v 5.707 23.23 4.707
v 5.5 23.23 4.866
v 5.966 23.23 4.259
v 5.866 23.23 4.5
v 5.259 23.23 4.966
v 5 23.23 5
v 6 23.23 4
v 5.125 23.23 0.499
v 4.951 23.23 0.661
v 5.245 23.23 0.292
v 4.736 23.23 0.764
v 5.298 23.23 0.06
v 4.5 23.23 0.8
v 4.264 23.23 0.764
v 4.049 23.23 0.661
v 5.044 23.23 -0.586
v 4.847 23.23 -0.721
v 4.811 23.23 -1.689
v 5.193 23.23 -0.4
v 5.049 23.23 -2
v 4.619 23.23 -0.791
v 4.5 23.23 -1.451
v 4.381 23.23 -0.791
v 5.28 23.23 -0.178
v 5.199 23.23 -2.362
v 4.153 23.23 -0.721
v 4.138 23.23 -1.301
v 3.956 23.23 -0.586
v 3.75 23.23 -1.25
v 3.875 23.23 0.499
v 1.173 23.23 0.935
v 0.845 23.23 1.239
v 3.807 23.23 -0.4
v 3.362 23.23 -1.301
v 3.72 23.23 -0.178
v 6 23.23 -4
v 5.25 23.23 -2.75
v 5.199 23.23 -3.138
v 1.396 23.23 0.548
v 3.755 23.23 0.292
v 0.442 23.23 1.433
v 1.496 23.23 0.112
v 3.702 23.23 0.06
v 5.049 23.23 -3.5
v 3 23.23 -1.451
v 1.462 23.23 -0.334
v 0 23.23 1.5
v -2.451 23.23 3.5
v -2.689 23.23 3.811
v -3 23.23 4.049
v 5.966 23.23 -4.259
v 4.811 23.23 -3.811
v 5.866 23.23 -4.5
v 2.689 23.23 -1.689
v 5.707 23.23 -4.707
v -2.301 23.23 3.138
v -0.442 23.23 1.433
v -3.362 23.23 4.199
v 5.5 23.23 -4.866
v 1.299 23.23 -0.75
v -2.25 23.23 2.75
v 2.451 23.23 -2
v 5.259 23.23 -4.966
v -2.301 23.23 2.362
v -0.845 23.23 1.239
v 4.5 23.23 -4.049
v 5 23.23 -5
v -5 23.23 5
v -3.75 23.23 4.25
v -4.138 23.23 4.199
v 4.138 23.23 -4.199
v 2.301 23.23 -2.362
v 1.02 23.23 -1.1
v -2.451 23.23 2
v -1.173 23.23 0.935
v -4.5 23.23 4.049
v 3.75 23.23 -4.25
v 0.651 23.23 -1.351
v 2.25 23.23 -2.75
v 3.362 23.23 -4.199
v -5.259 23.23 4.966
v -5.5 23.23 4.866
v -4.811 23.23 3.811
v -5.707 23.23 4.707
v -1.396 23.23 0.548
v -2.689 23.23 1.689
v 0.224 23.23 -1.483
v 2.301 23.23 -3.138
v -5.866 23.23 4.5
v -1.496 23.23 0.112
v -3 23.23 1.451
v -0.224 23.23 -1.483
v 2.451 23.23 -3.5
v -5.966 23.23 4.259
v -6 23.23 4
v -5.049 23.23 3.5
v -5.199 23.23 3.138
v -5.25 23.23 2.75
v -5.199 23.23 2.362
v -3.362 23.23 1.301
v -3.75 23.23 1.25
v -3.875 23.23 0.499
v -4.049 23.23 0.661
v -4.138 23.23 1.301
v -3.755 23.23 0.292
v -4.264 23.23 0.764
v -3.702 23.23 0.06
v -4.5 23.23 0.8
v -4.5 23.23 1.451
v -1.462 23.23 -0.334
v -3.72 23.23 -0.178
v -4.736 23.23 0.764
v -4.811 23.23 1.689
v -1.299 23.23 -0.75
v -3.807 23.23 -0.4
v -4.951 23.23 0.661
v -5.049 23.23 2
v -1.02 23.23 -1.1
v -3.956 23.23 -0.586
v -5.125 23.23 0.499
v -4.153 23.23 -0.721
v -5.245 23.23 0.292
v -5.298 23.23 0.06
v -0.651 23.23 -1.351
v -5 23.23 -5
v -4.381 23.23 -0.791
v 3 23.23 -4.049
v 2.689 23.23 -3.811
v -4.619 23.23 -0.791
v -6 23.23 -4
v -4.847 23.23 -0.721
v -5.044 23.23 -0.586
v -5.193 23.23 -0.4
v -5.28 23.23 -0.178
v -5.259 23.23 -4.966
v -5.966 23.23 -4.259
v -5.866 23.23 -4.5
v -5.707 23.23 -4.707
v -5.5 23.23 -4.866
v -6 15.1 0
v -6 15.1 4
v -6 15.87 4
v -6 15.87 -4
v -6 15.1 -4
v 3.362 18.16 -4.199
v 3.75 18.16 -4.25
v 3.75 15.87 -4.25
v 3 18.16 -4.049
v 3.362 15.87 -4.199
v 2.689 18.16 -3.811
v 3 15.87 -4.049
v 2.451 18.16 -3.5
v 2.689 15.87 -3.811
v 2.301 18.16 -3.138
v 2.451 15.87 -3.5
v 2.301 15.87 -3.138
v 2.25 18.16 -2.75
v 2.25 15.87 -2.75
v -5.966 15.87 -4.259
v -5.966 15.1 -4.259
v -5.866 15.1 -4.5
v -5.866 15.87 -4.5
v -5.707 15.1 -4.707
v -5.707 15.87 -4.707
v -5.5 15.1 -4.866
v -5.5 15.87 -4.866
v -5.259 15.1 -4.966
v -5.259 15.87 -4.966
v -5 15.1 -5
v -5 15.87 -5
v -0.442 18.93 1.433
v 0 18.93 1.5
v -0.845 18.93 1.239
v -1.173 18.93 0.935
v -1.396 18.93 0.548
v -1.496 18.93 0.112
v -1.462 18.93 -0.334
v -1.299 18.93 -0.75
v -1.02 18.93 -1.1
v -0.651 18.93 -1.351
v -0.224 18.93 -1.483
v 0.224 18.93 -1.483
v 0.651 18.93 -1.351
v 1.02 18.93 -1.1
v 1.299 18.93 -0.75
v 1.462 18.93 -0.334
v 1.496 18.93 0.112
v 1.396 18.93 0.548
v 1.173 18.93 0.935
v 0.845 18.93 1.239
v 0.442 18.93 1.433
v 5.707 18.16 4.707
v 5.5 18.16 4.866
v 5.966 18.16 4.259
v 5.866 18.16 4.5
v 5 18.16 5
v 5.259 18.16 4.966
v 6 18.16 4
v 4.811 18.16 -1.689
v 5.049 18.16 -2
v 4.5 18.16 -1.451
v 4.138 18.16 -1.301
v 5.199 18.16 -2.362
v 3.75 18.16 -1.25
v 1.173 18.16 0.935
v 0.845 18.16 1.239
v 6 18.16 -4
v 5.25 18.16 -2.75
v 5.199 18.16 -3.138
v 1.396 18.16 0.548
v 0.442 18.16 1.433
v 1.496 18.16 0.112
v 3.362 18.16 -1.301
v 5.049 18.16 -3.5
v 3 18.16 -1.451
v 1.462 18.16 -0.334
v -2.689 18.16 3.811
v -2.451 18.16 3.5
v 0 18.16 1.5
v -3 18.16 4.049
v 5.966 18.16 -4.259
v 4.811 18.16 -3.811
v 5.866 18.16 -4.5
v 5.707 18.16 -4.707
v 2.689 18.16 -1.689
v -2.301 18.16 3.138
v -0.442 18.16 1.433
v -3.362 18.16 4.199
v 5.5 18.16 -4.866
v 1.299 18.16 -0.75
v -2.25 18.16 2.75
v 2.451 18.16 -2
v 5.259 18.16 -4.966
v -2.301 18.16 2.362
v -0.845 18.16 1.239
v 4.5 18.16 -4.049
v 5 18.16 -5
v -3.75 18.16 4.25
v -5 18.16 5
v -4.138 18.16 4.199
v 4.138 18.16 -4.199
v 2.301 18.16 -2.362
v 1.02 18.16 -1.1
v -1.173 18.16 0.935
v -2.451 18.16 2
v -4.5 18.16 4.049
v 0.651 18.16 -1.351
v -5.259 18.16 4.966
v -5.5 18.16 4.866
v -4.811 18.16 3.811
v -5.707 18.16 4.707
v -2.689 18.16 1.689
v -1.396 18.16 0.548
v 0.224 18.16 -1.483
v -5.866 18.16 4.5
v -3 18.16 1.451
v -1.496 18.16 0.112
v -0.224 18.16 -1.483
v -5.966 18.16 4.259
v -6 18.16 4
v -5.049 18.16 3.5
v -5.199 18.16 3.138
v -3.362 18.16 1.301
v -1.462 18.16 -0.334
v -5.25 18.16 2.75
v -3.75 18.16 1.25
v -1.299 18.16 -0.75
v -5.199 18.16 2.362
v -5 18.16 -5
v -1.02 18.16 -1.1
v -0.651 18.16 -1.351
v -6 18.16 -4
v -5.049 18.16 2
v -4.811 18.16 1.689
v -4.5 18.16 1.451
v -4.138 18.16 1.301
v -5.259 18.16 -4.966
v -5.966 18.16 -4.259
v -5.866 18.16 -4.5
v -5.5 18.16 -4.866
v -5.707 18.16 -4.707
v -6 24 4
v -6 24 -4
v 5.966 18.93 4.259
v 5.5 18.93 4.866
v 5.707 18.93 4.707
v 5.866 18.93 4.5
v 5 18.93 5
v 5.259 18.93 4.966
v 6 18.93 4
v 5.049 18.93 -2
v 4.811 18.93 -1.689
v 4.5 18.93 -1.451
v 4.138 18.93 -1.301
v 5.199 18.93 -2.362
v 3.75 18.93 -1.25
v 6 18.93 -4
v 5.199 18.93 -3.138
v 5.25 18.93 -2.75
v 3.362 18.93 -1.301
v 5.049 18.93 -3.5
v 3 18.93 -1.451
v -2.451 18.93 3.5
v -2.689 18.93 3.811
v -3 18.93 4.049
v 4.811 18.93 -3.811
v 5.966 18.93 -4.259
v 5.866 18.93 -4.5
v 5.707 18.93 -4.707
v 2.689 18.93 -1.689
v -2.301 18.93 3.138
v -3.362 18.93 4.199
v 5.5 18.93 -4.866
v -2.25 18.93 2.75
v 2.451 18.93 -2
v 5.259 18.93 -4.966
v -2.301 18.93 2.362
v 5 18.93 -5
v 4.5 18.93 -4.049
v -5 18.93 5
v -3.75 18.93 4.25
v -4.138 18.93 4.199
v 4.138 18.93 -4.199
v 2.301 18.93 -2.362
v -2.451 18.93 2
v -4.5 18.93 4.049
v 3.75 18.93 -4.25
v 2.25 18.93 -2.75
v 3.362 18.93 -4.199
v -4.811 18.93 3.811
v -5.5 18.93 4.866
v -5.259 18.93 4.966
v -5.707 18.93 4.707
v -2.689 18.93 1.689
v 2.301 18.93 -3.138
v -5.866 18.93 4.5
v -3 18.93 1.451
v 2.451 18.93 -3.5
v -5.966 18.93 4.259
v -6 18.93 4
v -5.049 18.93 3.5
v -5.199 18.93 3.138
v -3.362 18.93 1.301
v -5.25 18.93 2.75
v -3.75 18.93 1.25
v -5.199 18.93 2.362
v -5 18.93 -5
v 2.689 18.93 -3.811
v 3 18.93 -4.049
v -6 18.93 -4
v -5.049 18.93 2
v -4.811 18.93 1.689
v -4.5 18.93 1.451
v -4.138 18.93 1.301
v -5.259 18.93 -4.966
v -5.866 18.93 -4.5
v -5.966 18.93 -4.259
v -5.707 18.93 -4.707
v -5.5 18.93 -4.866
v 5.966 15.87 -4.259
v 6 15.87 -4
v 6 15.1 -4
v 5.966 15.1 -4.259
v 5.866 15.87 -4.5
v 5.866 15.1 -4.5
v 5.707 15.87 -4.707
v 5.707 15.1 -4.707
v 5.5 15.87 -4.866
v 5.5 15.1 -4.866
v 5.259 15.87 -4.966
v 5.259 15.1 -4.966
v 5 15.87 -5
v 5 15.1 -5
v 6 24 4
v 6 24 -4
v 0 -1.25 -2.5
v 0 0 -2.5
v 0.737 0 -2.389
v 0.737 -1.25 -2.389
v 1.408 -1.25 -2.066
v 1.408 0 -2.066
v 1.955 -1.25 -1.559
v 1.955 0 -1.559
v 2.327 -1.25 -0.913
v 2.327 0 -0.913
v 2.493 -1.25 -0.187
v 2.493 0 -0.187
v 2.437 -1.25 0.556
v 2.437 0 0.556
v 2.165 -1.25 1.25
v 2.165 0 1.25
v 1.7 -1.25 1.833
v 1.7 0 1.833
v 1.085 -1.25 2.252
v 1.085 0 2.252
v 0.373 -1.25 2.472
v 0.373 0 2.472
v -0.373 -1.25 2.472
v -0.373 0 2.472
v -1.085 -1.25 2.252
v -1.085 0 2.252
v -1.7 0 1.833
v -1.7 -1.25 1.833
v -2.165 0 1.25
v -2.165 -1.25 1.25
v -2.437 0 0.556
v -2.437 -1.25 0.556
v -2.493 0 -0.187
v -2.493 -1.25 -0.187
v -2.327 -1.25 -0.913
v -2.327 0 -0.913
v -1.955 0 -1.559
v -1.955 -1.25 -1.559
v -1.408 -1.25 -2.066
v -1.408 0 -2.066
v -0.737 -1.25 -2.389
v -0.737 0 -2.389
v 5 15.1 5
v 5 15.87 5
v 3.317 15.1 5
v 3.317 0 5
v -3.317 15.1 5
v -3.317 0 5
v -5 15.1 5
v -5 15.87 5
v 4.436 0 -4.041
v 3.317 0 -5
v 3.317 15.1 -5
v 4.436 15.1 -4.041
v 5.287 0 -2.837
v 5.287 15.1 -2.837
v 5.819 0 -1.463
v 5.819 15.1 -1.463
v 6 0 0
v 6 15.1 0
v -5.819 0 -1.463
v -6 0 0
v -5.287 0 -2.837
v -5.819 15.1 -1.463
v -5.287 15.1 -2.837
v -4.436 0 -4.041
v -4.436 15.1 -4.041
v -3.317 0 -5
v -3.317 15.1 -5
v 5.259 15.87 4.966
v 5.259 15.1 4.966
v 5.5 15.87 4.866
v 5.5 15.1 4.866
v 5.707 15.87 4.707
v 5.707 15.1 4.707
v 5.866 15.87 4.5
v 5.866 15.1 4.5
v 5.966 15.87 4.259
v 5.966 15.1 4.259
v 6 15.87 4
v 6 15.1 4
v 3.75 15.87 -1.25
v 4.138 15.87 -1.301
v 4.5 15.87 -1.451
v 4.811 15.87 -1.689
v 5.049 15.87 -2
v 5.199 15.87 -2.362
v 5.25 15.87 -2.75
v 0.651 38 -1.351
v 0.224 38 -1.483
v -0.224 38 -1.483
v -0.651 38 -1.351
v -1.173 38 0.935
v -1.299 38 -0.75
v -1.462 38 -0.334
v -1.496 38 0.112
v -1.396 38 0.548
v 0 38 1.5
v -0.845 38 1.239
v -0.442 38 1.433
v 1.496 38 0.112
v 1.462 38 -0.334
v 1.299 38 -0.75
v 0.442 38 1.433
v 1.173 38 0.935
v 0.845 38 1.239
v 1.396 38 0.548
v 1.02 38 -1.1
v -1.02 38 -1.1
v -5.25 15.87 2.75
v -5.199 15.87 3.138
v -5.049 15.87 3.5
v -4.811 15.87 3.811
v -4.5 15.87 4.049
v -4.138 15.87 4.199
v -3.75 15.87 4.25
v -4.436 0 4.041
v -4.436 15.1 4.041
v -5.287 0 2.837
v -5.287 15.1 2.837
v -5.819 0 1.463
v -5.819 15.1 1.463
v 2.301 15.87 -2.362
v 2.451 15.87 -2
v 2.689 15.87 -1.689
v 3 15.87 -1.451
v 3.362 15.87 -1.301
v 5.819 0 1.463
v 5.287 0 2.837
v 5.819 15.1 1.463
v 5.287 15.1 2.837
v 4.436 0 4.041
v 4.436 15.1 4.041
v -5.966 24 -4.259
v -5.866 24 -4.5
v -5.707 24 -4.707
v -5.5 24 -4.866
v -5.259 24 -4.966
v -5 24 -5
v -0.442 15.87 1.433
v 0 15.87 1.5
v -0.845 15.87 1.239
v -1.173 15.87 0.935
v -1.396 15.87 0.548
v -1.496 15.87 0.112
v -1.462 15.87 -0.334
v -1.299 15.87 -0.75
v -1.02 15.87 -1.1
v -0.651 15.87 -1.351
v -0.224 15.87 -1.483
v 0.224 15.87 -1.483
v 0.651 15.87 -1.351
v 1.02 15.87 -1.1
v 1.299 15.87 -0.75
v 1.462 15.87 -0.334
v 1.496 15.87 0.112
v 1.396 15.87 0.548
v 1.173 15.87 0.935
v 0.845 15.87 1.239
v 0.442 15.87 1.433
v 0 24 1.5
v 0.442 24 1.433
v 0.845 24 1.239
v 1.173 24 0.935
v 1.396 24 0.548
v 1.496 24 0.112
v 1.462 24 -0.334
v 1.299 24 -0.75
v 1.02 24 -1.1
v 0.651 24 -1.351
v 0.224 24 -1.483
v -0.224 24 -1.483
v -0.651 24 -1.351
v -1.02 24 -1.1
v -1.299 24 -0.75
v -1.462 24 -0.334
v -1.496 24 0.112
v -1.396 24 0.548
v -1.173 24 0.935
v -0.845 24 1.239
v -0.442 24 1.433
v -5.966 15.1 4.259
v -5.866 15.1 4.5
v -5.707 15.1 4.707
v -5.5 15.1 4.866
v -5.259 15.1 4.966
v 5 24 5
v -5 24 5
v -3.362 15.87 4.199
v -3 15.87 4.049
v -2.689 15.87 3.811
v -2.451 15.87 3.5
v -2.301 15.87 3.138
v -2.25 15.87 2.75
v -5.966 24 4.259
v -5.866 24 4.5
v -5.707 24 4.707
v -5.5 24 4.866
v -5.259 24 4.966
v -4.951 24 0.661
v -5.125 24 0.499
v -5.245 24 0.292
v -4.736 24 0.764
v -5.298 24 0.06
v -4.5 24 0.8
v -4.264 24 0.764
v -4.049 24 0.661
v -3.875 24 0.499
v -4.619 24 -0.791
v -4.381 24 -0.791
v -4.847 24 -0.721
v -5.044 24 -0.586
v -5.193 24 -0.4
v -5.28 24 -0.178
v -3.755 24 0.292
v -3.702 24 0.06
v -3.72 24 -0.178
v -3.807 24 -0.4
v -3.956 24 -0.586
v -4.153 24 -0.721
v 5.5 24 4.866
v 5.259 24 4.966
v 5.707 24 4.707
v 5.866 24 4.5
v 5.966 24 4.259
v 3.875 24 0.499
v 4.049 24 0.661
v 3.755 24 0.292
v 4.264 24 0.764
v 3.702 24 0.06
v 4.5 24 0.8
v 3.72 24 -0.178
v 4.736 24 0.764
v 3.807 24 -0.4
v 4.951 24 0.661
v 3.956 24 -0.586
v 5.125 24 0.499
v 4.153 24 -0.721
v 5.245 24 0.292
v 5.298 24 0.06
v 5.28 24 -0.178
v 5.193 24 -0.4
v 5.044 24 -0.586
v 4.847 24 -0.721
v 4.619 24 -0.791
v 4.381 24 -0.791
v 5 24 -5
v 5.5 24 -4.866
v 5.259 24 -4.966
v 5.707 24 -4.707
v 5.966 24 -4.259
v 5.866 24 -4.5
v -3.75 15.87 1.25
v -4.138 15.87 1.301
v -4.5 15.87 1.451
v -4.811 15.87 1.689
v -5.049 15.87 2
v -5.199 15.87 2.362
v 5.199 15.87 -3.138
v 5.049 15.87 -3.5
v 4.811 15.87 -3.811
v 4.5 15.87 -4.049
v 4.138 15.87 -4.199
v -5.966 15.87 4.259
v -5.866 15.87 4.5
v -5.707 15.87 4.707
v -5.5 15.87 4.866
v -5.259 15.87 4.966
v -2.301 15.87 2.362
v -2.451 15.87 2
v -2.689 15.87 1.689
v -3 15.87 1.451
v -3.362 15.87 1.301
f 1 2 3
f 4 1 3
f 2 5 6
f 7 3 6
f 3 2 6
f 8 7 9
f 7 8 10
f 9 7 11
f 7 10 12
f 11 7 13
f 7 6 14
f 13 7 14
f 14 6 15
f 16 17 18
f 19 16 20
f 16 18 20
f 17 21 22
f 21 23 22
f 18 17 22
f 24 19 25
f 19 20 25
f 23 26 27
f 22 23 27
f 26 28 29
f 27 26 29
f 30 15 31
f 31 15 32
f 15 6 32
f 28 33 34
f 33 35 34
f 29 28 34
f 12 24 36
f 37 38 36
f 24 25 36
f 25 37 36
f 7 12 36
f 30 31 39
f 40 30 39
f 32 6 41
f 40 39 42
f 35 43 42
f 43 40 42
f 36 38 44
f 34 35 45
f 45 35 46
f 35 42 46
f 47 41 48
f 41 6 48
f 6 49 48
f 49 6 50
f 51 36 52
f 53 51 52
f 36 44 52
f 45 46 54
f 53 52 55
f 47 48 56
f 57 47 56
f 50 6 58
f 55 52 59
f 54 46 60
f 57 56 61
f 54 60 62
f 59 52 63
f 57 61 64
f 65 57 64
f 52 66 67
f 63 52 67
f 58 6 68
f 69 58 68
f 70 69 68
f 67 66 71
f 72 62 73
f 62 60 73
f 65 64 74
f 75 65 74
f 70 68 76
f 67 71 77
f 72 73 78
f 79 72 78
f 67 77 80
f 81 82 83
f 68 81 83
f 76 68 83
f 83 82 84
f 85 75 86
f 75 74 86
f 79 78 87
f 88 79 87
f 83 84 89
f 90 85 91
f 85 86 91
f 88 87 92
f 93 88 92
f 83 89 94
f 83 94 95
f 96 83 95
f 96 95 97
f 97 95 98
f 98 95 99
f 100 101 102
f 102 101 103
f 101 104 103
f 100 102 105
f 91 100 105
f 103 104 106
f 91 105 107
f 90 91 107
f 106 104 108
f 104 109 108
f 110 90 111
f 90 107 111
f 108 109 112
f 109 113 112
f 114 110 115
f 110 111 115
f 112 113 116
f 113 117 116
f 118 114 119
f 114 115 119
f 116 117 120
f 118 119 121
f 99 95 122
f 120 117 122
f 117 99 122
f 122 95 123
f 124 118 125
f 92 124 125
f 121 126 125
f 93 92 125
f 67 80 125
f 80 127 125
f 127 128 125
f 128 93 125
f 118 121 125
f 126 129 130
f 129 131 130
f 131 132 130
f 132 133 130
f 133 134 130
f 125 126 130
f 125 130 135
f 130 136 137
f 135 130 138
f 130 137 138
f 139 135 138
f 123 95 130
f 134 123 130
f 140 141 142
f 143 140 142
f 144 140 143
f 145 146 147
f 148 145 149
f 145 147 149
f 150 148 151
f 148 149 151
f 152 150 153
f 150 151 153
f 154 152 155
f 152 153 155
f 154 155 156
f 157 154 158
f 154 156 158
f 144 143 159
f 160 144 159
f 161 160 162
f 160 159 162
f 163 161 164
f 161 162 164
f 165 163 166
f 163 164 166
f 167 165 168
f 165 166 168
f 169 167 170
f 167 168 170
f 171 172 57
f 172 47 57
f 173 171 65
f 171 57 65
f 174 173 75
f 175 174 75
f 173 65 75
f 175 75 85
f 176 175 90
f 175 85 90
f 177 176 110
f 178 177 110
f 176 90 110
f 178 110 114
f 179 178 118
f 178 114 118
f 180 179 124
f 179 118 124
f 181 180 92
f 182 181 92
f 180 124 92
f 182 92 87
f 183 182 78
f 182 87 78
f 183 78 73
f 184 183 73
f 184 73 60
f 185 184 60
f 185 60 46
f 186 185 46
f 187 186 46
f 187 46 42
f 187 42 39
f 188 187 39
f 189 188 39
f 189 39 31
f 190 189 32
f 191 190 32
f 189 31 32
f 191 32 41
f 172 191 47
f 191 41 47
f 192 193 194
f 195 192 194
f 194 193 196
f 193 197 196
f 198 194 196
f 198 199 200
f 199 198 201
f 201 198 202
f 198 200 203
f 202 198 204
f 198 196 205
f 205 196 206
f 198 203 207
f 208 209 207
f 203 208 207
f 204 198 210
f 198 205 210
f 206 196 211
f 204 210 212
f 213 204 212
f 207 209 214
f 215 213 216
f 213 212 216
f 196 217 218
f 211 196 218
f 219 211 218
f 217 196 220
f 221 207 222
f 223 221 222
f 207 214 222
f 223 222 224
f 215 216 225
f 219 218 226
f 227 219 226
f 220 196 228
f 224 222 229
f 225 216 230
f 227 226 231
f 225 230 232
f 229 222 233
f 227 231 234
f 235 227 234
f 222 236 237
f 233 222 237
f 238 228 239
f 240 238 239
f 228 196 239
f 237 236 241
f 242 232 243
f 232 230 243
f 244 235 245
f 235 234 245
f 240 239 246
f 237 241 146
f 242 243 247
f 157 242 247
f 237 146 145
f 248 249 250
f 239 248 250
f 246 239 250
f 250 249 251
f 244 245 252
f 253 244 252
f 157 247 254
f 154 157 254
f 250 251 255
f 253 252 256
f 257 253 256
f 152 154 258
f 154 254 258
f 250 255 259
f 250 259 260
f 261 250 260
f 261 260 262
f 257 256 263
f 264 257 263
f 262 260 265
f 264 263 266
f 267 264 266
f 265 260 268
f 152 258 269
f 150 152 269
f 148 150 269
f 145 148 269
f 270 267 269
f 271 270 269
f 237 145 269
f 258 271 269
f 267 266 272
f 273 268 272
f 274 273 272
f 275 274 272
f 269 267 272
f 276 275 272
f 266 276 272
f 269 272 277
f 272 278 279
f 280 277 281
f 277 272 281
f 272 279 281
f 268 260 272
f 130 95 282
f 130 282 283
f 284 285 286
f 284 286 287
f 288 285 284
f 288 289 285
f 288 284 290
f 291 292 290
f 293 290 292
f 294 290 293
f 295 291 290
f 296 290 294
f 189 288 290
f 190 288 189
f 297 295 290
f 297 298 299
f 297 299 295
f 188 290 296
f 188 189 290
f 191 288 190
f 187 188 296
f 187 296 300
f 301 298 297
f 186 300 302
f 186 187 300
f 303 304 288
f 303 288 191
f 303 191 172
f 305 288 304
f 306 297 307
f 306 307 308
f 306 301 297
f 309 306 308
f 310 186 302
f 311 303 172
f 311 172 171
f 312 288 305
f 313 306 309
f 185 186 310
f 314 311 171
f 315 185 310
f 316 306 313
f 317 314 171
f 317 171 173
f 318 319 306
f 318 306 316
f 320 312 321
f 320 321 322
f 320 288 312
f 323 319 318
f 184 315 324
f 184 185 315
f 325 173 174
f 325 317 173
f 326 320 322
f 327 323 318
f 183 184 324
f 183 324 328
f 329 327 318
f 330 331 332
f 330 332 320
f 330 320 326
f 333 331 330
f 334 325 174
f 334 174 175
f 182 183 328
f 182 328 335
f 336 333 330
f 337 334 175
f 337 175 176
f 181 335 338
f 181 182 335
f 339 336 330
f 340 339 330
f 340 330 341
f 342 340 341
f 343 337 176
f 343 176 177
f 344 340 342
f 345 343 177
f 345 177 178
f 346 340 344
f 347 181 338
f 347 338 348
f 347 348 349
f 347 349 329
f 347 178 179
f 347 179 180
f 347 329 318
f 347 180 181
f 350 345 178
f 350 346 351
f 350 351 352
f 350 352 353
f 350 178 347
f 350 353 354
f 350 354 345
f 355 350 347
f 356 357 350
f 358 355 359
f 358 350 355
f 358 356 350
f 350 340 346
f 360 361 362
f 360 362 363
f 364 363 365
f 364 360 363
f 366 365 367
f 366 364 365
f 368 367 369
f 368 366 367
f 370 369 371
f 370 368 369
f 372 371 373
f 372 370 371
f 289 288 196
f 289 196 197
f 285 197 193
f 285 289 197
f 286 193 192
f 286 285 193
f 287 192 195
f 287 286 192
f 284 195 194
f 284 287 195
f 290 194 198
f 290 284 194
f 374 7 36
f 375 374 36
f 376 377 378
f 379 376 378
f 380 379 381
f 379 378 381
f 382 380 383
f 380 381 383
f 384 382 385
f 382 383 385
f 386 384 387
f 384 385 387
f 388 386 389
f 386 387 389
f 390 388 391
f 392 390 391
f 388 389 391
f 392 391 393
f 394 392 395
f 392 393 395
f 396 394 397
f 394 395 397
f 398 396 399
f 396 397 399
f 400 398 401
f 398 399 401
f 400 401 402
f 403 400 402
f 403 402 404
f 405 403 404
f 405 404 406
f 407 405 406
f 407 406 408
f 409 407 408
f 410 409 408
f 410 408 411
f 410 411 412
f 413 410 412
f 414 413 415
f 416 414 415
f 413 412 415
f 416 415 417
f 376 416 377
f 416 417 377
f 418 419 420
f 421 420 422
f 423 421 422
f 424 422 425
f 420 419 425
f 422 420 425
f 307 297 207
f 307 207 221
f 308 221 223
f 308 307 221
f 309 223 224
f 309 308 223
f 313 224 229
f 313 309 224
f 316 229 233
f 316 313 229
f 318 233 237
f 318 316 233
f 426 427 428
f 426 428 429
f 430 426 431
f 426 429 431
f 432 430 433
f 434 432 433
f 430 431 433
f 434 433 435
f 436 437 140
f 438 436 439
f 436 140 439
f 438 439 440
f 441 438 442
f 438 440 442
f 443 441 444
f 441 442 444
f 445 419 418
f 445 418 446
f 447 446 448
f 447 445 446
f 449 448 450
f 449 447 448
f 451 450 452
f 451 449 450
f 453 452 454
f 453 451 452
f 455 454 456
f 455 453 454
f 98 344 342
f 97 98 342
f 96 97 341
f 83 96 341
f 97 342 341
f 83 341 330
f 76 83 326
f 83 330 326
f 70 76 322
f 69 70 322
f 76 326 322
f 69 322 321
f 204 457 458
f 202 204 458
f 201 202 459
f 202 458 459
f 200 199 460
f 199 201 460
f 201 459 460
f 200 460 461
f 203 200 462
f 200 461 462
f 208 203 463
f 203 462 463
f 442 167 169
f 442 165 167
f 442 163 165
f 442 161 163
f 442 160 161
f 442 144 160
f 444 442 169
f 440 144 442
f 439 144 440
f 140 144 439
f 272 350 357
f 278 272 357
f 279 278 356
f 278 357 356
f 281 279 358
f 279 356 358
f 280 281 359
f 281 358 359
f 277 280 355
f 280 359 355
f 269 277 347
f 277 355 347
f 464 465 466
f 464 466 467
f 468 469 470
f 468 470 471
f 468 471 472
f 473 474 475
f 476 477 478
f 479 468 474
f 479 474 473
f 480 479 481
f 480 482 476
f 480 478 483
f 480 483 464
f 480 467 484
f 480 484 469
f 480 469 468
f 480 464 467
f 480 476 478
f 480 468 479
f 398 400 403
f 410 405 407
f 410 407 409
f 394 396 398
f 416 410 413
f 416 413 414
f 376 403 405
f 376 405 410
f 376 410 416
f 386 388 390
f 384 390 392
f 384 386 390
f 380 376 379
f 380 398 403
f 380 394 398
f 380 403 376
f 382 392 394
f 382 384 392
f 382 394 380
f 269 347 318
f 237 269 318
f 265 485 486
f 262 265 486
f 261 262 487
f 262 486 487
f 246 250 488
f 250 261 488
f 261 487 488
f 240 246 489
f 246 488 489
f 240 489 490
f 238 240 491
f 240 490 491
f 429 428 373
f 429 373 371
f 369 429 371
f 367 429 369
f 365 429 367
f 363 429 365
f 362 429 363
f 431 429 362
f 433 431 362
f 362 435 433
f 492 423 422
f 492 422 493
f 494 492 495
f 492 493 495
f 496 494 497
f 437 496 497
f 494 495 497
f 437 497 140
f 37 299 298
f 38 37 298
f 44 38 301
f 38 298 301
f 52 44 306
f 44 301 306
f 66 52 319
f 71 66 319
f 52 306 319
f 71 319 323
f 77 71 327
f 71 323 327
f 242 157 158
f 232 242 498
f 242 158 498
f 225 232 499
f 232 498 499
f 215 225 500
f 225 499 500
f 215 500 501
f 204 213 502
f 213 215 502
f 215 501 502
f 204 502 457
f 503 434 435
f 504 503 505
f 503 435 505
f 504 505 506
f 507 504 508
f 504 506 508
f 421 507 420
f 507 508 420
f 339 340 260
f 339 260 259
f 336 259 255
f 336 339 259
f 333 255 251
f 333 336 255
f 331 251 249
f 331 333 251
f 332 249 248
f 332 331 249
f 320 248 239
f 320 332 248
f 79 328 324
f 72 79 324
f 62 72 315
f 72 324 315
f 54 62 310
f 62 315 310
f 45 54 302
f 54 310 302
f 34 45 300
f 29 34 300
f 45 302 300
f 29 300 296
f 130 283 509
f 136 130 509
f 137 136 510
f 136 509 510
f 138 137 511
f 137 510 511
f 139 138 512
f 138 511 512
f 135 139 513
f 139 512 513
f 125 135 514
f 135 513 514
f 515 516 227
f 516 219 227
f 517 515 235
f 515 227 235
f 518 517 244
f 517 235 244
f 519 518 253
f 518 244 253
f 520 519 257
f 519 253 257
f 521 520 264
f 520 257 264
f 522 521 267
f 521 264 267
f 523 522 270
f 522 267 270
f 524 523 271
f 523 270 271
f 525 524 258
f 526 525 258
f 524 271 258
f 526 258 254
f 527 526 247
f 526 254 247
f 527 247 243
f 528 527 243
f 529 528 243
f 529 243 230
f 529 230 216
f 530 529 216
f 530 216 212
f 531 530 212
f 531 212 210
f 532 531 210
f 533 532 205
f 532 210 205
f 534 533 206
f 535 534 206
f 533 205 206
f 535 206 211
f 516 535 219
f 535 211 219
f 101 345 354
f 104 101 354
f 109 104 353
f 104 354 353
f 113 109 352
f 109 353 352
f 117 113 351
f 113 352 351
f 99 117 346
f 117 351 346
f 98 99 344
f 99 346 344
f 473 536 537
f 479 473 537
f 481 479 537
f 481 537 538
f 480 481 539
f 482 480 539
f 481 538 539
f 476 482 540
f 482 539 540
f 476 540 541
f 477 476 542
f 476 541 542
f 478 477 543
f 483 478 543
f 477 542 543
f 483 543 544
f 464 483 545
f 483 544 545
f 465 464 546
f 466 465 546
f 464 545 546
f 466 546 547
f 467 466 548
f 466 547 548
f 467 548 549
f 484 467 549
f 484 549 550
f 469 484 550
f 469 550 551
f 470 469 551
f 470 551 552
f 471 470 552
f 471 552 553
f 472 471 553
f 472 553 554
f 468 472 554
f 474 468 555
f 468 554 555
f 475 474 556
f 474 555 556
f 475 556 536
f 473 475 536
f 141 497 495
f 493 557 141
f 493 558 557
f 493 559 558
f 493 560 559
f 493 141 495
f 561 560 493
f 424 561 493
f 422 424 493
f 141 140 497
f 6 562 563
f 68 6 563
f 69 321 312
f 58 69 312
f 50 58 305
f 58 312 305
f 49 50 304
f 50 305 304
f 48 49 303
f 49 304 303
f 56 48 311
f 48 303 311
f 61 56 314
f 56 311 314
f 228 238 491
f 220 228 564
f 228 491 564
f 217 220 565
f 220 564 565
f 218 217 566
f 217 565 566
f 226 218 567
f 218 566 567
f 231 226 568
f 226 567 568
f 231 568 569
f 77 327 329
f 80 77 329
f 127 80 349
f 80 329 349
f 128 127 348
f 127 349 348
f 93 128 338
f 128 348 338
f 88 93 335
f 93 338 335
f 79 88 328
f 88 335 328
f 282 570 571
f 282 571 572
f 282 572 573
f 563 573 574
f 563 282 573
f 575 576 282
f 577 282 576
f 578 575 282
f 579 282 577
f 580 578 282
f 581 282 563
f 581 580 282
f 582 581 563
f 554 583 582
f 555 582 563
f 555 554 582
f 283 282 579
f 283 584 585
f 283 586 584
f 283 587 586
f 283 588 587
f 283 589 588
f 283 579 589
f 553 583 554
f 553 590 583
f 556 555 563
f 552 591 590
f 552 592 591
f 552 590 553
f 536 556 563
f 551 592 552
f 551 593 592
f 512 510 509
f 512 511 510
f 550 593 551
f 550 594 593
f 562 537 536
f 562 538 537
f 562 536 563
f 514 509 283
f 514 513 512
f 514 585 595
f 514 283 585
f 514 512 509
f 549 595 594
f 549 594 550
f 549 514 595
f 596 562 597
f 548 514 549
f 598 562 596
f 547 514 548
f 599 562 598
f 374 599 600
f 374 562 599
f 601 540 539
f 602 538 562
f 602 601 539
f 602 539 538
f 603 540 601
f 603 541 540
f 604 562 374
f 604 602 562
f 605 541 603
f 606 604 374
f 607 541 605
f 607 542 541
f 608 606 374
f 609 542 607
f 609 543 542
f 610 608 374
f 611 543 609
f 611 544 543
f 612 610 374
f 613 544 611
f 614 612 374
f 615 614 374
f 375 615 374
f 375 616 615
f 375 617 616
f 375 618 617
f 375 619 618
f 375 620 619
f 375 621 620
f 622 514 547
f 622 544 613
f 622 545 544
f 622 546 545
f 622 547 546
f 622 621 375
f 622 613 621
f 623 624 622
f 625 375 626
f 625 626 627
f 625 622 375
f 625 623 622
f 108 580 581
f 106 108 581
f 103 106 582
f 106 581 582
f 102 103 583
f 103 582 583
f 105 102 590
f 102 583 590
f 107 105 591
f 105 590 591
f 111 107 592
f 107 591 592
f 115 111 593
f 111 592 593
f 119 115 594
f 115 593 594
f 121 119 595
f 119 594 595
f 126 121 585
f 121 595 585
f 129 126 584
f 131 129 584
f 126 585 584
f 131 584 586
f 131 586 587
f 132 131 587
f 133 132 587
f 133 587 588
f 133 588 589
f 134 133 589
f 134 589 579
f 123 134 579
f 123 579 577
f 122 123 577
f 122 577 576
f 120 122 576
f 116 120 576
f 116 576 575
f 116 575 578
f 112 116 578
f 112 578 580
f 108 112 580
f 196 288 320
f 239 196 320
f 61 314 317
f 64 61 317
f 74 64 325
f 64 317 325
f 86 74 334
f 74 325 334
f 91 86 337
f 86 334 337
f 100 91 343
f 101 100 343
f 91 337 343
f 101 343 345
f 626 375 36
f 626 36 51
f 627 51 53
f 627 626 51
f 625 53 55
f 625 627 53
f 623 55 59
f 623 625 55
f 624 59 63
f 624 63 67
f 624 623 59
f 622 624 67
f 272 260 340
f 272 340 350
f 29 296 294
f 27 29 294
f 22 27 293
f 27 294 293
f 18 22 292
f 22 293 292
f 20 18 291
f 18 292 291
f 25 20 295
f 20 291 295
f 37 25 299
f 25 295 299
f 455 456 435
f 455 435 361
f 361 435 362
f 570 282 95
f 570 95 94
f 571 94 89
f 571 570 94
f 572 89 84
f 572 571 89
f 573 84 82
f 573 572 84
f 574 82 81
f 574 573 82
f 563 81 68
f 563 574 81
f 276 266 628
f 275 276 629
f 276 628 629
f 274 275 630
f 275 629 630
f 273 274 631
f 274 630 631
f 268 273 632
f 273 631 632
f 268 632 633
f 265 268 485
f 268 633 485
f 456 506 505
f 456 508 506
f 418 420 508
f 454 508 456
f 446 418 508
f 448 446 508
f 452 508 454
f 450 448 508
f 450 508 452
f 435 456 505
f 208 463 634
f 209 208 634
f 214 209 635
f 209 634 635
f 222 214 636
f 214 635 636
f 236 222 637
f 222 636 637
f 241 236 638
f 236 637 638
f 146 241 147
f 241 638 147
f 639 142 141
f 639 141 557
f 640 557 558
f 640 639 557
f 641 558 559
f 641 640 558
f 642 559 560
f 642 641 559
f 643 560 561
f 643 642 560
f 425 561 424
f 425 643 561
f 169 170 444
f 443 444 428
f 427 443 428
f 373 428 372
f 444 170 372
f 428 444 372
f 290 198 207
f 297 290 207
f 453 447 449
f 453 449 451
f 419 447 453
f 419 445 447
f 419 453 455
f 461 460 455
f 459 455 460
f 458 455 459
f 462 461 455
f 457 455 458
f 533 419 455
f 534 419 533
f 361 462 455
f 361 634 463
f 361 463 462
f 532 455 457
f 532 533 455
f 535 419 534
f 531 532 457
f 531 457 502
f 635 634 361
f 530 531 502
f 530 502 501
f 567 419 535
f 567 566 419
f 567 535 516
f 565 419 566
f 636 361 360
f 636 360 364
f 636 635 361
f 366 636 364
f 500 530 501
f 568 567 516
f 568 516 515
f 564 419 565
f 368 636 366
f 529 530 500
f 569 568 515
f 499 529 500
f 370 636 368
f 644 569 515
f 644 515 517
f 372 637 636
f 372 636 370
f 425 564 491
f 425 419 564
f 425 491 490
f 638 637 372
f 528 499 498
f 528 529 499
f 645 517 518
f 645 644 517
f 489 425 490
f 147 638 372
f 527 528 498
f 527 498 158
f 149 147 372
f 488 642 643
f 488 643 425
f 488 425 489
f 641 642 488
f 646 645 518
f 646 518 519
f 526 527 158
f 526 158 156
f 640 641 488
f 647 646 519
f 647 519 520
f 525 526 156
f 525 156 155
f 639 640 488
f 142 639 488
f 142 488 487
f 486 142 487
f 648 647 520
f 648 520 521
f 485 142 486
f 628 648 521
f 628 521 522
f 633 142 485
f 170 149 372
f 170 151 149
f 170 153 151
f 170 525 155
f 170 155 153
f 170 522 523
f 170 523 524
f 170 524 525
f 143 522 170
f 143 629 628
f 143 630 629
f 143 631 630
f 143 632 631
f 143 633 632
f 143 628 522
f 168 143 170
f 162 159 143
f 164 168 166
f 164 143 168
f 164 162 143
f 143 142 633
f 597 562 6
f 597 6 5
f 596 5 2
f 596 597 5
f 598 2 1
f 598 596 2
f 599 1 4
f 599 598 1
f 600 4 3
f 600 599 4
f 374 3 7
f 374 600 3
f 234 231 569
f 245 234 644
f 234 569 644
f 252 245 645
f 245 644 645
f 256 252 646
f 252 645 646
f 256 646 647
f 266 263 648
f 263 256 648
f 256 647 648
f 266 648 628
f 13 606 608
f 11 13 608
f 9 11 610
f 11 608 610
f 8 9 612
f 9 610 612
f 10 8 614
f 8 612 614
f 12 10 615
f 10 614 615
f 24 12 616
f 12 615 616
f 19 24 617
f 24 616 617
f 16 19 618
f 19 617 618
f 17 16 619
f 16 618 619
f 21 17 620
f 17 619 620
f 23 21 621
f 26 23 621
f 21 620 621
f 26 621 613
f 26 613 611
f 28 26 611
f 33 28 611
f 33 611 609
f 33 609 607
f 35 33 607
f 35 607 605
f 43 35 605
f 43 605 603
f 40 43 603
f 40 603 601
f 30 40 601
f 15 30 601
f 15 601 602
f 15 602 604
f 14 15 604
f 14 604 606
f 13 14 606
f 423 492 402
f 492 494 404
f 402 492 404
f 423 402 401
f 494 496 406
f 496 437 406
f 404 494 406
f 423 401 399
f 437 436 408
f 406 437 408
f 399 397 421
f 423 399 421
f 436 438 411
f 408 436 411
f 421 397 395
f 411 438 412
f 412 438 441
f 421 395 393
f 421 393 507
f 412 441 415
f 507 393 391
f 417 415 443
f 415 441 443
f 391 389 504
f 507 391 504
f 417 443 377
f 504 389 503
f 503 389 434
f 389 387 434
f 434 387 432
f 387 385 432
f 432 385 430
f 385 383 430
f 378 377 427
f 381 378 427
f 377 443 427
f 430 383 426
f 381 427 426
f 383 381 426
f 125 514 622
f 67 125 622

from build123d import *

# Parameters (mm, degrees)
SKETCH_1_W          = 12
SKETCH_1_H          = 10
EXTRUDE_1_DEPTH     = 24
FILLET_1_R          = 1
CUT_EXTRUDE_START   = -15.1
SKETCH_2_OUTSIDE_W  = 19.728
SKETCH_2_OUTSIDE_H  = 17.728
CUT_EXTRUDE_1_DEPTH = 15.1
SKETCH_3_R          = 1.5
EXTRUDE_2_DEPTH     = 14
SKETCH_5_R          = 2.5
EXTRUDE_3_DEPTH     = 1.25
SKETCH_6_W          = 20
SKETCH_6_H          = 4.3
SKETCH_6_H_2        = 2.29
CUT_EXTRUDE_2_REACH = 28.43
SKETCH_4_R          = 0.8
EXTRUDE_START       = -8.13
EXTRUDE_4_DEPTH     = 7.36


with BuildPart() as part:
    # 草图1 → 凸台-拉伸1 (new body)
    with BuildSketch(Plane(origin=(0, 0, 0), x_dir=(1, 0, 0), z_dir=(0, 1, 0))):
        Rectangle(SKETCH_1_W, SKETCH_1_H)
    extrude(amount=EXTRUDE_1_DEPTH)

    # 圆角1
    fillet_1_edges = [part.edges().sort_by_distance(p)[0] for p in [
        (6, 12, 5),
        (-6, 12, 5),
        (-6, 12, -5),
        (6, 12, -5),
    ]]
    fillet(fillet_1_edges, radius=FILLET_1_R)

    # 草图2 outside → 切除-拉伸1 (cut)
    with BuildSketch(Plane.XZ.offset(CUT_EXTRUDE_START)):
        Rectangle(SKETCH_2_OUTSIDE_W, SKETCH_2_OUTSIDE_H)
        with BuildLine():
            Line((-3.31662479, -5), (3.31662479, -5))
            ThreePointArc((3.31662479, -5), (5.286764074, -2.837274331), (6, 0))
            ThreePointArc((6, 0), (5.286764074, 2.837274331), (3.31662479, 5))
            Line((3.31662479, 5), (-3.31662479, 5))
            ThreePointArc((-3.31662479, 5), (-5.286764074, 2.837274331), (-6, 0))
            ThreePointArc((-6, 0), (-5.286764074, -2.837274331), (-3.31662479, -5))
        make_face(mode=Mode.SUBTRACT)
    extrude(amount=CUT_EXTRUDE_1_DEPTH, mode=Mode.SUBTRACT)

    # 草图3 → 凸台-拉伸2 (add)
    with BuildSketch(Plane(origin=(0, 24, 0), x_dir=(1, 0, 0), z_dir=(0, 1, 0))):
        with Locations(Location((0, 0, 0), (0, 0, 270))):
            Circle(SKETCH_3_R)
    extrude(amount=EXTRUDE_2_DEPTH)

    # 草图5 → 凸台-拉伸3 (add)
    with BuildSketch(Plane.XZ):
        with Locations(Location((0, 0, 0), (0, 0, 270))):
            Circle(SKETCH_5_R)
    extrude(amount=EXTRUDE_3_DEPTH)

    # 草图6 → 切除-旋转3 (revolve, cut)
    with BuildSketch(Plane.XY, mode=Mode.PRIVATE) as cut_revolve_3_sk:
        with Locations((11.5, 21.08)):
            Rectangle(SKETCH_6_W, SKETCH_6_H)
        with Locations((11.5, 17.015)):
            Rectangle(SKETCH_6_W, SKETCH_6_H_2)
    revolve(cut_revolve_3_sk.sketch.rotate(Axis((0, 38, 0), (0, -1, 0)), 90), axis=Axis((0, 38, 0), (0, -1, 0)), mode=Mode.SUBTRACT)

    # 草图4 → 切除-拉伸2 (cut, up to next)
    with BuildSketch(Plane(origin=(0, 24, 0), x_dir=(1, 0, 0), z_dir=(0, 1, 0)), mode=Mode.PRIVATE) as cut_extrude_2_sk1:
        with Locations(Location((-4.5, 0, 0), (0, 0, 270))):
            Circle(SKETCH_4_R)
    cut_extrude_2_tool1 = extrude(cut_extrude_2_sk1.sketch, amount=-CUT_EXTRUDE_2_REACH, mode=Mode.PRIVATE) & part.part
    # 草图4 → 切除-拉伸2 (cut, up to next)
    with BuildSketch(Plane(origin=(0, 24, 0), x_dir=(1, 0, 0), z_dir=(0, 1, 0)), mode=Mode.PRIVATE) as cut_extrude_2_sk2:
        with Locations(Location((4.5, 0, 0), (0, 0, 270))):
            Circle(SKETCH_4_R)
    cut_extrude_2_tool2 = extrude(cut_extrude_2_sk2.sketch, amount=-CUT_EXTRUDE_2_REACH, mode=Mode.PRIVATE) & part.part
    add(cut_extrude_2_tool1.solids().sort_by_distance((-4.5, 24, 0))[0], mode=Mode.SUBTRACT)
    add(cut_extrude_2_tool2.solids().sort_by_distance((4.5, 24, 0))[0], mode=Mode.SUBTRACT)

    # 草图7 → 凸台-拉伸4 (add)
    with BuildSketch(Plane(origin=(0, 24, 0), x_dir=(1, 0, 0), z_dir=(0, 1, 0)).offset(EXTRUDE_START)):
        with BuildLine():
            ThreePointArc((3.75, 1.25), (4.810660172, 1.689339828), (5.25, 2.75))
            ThreePointArc((5.25, 2.75), (4.810660174, 3.81066017), (3.750000005, 4.25))
            ThreePointArc((3.750000005, 4.25), (2.68933983, 3.810660174), (2.25, 2.75))
            Line((2.25, 2.75), (3.75, 2.75))
            Line((3.75, 2.75), (3.75, 1.25))
        make_face()
        with BuildLine():
            ThreePointArc((2.25, 2.75), (2.689339828, 1.689339828), (3.75, 1.25))
            Line((3.75, 1.25), (3.75, 2.75))
            Line((3.75, 2.75), (2.25, 2.75))
        make_face()
        with BuildLine():
            ThreePointArc((-5.25, -2.750000006), (-4.810660171, -3.810660173), (-3.750000004, -4.25))
            ThreePointArc((-3.750000004, -4.25), (-2.68933983, -3.810660173), (-2.25, -2.75))
            Line((-2.25, -2.75), (-3.75, -2.75))
            Line((-3.75, -2.75), (-3.75, -1.25))
            ThreePointArc((-3.75, -1.25), (-4.810660174, -1.68933983), (-5.25, -2.750000006))
        make_face()
        with BuildLine():
            Line((-3.75, -2.75), (-2.25, -2.75))
            ThreePointArc((-2.25, -2.75), (-2.689339828, -1.689339828), (-3.75, -1.25))
            Line((-3.75, -1.25), (-3.75, -2.75))
        make_face()
    extrude(amount=EXTRUDE_4_DEPTH)


solid = part.part
